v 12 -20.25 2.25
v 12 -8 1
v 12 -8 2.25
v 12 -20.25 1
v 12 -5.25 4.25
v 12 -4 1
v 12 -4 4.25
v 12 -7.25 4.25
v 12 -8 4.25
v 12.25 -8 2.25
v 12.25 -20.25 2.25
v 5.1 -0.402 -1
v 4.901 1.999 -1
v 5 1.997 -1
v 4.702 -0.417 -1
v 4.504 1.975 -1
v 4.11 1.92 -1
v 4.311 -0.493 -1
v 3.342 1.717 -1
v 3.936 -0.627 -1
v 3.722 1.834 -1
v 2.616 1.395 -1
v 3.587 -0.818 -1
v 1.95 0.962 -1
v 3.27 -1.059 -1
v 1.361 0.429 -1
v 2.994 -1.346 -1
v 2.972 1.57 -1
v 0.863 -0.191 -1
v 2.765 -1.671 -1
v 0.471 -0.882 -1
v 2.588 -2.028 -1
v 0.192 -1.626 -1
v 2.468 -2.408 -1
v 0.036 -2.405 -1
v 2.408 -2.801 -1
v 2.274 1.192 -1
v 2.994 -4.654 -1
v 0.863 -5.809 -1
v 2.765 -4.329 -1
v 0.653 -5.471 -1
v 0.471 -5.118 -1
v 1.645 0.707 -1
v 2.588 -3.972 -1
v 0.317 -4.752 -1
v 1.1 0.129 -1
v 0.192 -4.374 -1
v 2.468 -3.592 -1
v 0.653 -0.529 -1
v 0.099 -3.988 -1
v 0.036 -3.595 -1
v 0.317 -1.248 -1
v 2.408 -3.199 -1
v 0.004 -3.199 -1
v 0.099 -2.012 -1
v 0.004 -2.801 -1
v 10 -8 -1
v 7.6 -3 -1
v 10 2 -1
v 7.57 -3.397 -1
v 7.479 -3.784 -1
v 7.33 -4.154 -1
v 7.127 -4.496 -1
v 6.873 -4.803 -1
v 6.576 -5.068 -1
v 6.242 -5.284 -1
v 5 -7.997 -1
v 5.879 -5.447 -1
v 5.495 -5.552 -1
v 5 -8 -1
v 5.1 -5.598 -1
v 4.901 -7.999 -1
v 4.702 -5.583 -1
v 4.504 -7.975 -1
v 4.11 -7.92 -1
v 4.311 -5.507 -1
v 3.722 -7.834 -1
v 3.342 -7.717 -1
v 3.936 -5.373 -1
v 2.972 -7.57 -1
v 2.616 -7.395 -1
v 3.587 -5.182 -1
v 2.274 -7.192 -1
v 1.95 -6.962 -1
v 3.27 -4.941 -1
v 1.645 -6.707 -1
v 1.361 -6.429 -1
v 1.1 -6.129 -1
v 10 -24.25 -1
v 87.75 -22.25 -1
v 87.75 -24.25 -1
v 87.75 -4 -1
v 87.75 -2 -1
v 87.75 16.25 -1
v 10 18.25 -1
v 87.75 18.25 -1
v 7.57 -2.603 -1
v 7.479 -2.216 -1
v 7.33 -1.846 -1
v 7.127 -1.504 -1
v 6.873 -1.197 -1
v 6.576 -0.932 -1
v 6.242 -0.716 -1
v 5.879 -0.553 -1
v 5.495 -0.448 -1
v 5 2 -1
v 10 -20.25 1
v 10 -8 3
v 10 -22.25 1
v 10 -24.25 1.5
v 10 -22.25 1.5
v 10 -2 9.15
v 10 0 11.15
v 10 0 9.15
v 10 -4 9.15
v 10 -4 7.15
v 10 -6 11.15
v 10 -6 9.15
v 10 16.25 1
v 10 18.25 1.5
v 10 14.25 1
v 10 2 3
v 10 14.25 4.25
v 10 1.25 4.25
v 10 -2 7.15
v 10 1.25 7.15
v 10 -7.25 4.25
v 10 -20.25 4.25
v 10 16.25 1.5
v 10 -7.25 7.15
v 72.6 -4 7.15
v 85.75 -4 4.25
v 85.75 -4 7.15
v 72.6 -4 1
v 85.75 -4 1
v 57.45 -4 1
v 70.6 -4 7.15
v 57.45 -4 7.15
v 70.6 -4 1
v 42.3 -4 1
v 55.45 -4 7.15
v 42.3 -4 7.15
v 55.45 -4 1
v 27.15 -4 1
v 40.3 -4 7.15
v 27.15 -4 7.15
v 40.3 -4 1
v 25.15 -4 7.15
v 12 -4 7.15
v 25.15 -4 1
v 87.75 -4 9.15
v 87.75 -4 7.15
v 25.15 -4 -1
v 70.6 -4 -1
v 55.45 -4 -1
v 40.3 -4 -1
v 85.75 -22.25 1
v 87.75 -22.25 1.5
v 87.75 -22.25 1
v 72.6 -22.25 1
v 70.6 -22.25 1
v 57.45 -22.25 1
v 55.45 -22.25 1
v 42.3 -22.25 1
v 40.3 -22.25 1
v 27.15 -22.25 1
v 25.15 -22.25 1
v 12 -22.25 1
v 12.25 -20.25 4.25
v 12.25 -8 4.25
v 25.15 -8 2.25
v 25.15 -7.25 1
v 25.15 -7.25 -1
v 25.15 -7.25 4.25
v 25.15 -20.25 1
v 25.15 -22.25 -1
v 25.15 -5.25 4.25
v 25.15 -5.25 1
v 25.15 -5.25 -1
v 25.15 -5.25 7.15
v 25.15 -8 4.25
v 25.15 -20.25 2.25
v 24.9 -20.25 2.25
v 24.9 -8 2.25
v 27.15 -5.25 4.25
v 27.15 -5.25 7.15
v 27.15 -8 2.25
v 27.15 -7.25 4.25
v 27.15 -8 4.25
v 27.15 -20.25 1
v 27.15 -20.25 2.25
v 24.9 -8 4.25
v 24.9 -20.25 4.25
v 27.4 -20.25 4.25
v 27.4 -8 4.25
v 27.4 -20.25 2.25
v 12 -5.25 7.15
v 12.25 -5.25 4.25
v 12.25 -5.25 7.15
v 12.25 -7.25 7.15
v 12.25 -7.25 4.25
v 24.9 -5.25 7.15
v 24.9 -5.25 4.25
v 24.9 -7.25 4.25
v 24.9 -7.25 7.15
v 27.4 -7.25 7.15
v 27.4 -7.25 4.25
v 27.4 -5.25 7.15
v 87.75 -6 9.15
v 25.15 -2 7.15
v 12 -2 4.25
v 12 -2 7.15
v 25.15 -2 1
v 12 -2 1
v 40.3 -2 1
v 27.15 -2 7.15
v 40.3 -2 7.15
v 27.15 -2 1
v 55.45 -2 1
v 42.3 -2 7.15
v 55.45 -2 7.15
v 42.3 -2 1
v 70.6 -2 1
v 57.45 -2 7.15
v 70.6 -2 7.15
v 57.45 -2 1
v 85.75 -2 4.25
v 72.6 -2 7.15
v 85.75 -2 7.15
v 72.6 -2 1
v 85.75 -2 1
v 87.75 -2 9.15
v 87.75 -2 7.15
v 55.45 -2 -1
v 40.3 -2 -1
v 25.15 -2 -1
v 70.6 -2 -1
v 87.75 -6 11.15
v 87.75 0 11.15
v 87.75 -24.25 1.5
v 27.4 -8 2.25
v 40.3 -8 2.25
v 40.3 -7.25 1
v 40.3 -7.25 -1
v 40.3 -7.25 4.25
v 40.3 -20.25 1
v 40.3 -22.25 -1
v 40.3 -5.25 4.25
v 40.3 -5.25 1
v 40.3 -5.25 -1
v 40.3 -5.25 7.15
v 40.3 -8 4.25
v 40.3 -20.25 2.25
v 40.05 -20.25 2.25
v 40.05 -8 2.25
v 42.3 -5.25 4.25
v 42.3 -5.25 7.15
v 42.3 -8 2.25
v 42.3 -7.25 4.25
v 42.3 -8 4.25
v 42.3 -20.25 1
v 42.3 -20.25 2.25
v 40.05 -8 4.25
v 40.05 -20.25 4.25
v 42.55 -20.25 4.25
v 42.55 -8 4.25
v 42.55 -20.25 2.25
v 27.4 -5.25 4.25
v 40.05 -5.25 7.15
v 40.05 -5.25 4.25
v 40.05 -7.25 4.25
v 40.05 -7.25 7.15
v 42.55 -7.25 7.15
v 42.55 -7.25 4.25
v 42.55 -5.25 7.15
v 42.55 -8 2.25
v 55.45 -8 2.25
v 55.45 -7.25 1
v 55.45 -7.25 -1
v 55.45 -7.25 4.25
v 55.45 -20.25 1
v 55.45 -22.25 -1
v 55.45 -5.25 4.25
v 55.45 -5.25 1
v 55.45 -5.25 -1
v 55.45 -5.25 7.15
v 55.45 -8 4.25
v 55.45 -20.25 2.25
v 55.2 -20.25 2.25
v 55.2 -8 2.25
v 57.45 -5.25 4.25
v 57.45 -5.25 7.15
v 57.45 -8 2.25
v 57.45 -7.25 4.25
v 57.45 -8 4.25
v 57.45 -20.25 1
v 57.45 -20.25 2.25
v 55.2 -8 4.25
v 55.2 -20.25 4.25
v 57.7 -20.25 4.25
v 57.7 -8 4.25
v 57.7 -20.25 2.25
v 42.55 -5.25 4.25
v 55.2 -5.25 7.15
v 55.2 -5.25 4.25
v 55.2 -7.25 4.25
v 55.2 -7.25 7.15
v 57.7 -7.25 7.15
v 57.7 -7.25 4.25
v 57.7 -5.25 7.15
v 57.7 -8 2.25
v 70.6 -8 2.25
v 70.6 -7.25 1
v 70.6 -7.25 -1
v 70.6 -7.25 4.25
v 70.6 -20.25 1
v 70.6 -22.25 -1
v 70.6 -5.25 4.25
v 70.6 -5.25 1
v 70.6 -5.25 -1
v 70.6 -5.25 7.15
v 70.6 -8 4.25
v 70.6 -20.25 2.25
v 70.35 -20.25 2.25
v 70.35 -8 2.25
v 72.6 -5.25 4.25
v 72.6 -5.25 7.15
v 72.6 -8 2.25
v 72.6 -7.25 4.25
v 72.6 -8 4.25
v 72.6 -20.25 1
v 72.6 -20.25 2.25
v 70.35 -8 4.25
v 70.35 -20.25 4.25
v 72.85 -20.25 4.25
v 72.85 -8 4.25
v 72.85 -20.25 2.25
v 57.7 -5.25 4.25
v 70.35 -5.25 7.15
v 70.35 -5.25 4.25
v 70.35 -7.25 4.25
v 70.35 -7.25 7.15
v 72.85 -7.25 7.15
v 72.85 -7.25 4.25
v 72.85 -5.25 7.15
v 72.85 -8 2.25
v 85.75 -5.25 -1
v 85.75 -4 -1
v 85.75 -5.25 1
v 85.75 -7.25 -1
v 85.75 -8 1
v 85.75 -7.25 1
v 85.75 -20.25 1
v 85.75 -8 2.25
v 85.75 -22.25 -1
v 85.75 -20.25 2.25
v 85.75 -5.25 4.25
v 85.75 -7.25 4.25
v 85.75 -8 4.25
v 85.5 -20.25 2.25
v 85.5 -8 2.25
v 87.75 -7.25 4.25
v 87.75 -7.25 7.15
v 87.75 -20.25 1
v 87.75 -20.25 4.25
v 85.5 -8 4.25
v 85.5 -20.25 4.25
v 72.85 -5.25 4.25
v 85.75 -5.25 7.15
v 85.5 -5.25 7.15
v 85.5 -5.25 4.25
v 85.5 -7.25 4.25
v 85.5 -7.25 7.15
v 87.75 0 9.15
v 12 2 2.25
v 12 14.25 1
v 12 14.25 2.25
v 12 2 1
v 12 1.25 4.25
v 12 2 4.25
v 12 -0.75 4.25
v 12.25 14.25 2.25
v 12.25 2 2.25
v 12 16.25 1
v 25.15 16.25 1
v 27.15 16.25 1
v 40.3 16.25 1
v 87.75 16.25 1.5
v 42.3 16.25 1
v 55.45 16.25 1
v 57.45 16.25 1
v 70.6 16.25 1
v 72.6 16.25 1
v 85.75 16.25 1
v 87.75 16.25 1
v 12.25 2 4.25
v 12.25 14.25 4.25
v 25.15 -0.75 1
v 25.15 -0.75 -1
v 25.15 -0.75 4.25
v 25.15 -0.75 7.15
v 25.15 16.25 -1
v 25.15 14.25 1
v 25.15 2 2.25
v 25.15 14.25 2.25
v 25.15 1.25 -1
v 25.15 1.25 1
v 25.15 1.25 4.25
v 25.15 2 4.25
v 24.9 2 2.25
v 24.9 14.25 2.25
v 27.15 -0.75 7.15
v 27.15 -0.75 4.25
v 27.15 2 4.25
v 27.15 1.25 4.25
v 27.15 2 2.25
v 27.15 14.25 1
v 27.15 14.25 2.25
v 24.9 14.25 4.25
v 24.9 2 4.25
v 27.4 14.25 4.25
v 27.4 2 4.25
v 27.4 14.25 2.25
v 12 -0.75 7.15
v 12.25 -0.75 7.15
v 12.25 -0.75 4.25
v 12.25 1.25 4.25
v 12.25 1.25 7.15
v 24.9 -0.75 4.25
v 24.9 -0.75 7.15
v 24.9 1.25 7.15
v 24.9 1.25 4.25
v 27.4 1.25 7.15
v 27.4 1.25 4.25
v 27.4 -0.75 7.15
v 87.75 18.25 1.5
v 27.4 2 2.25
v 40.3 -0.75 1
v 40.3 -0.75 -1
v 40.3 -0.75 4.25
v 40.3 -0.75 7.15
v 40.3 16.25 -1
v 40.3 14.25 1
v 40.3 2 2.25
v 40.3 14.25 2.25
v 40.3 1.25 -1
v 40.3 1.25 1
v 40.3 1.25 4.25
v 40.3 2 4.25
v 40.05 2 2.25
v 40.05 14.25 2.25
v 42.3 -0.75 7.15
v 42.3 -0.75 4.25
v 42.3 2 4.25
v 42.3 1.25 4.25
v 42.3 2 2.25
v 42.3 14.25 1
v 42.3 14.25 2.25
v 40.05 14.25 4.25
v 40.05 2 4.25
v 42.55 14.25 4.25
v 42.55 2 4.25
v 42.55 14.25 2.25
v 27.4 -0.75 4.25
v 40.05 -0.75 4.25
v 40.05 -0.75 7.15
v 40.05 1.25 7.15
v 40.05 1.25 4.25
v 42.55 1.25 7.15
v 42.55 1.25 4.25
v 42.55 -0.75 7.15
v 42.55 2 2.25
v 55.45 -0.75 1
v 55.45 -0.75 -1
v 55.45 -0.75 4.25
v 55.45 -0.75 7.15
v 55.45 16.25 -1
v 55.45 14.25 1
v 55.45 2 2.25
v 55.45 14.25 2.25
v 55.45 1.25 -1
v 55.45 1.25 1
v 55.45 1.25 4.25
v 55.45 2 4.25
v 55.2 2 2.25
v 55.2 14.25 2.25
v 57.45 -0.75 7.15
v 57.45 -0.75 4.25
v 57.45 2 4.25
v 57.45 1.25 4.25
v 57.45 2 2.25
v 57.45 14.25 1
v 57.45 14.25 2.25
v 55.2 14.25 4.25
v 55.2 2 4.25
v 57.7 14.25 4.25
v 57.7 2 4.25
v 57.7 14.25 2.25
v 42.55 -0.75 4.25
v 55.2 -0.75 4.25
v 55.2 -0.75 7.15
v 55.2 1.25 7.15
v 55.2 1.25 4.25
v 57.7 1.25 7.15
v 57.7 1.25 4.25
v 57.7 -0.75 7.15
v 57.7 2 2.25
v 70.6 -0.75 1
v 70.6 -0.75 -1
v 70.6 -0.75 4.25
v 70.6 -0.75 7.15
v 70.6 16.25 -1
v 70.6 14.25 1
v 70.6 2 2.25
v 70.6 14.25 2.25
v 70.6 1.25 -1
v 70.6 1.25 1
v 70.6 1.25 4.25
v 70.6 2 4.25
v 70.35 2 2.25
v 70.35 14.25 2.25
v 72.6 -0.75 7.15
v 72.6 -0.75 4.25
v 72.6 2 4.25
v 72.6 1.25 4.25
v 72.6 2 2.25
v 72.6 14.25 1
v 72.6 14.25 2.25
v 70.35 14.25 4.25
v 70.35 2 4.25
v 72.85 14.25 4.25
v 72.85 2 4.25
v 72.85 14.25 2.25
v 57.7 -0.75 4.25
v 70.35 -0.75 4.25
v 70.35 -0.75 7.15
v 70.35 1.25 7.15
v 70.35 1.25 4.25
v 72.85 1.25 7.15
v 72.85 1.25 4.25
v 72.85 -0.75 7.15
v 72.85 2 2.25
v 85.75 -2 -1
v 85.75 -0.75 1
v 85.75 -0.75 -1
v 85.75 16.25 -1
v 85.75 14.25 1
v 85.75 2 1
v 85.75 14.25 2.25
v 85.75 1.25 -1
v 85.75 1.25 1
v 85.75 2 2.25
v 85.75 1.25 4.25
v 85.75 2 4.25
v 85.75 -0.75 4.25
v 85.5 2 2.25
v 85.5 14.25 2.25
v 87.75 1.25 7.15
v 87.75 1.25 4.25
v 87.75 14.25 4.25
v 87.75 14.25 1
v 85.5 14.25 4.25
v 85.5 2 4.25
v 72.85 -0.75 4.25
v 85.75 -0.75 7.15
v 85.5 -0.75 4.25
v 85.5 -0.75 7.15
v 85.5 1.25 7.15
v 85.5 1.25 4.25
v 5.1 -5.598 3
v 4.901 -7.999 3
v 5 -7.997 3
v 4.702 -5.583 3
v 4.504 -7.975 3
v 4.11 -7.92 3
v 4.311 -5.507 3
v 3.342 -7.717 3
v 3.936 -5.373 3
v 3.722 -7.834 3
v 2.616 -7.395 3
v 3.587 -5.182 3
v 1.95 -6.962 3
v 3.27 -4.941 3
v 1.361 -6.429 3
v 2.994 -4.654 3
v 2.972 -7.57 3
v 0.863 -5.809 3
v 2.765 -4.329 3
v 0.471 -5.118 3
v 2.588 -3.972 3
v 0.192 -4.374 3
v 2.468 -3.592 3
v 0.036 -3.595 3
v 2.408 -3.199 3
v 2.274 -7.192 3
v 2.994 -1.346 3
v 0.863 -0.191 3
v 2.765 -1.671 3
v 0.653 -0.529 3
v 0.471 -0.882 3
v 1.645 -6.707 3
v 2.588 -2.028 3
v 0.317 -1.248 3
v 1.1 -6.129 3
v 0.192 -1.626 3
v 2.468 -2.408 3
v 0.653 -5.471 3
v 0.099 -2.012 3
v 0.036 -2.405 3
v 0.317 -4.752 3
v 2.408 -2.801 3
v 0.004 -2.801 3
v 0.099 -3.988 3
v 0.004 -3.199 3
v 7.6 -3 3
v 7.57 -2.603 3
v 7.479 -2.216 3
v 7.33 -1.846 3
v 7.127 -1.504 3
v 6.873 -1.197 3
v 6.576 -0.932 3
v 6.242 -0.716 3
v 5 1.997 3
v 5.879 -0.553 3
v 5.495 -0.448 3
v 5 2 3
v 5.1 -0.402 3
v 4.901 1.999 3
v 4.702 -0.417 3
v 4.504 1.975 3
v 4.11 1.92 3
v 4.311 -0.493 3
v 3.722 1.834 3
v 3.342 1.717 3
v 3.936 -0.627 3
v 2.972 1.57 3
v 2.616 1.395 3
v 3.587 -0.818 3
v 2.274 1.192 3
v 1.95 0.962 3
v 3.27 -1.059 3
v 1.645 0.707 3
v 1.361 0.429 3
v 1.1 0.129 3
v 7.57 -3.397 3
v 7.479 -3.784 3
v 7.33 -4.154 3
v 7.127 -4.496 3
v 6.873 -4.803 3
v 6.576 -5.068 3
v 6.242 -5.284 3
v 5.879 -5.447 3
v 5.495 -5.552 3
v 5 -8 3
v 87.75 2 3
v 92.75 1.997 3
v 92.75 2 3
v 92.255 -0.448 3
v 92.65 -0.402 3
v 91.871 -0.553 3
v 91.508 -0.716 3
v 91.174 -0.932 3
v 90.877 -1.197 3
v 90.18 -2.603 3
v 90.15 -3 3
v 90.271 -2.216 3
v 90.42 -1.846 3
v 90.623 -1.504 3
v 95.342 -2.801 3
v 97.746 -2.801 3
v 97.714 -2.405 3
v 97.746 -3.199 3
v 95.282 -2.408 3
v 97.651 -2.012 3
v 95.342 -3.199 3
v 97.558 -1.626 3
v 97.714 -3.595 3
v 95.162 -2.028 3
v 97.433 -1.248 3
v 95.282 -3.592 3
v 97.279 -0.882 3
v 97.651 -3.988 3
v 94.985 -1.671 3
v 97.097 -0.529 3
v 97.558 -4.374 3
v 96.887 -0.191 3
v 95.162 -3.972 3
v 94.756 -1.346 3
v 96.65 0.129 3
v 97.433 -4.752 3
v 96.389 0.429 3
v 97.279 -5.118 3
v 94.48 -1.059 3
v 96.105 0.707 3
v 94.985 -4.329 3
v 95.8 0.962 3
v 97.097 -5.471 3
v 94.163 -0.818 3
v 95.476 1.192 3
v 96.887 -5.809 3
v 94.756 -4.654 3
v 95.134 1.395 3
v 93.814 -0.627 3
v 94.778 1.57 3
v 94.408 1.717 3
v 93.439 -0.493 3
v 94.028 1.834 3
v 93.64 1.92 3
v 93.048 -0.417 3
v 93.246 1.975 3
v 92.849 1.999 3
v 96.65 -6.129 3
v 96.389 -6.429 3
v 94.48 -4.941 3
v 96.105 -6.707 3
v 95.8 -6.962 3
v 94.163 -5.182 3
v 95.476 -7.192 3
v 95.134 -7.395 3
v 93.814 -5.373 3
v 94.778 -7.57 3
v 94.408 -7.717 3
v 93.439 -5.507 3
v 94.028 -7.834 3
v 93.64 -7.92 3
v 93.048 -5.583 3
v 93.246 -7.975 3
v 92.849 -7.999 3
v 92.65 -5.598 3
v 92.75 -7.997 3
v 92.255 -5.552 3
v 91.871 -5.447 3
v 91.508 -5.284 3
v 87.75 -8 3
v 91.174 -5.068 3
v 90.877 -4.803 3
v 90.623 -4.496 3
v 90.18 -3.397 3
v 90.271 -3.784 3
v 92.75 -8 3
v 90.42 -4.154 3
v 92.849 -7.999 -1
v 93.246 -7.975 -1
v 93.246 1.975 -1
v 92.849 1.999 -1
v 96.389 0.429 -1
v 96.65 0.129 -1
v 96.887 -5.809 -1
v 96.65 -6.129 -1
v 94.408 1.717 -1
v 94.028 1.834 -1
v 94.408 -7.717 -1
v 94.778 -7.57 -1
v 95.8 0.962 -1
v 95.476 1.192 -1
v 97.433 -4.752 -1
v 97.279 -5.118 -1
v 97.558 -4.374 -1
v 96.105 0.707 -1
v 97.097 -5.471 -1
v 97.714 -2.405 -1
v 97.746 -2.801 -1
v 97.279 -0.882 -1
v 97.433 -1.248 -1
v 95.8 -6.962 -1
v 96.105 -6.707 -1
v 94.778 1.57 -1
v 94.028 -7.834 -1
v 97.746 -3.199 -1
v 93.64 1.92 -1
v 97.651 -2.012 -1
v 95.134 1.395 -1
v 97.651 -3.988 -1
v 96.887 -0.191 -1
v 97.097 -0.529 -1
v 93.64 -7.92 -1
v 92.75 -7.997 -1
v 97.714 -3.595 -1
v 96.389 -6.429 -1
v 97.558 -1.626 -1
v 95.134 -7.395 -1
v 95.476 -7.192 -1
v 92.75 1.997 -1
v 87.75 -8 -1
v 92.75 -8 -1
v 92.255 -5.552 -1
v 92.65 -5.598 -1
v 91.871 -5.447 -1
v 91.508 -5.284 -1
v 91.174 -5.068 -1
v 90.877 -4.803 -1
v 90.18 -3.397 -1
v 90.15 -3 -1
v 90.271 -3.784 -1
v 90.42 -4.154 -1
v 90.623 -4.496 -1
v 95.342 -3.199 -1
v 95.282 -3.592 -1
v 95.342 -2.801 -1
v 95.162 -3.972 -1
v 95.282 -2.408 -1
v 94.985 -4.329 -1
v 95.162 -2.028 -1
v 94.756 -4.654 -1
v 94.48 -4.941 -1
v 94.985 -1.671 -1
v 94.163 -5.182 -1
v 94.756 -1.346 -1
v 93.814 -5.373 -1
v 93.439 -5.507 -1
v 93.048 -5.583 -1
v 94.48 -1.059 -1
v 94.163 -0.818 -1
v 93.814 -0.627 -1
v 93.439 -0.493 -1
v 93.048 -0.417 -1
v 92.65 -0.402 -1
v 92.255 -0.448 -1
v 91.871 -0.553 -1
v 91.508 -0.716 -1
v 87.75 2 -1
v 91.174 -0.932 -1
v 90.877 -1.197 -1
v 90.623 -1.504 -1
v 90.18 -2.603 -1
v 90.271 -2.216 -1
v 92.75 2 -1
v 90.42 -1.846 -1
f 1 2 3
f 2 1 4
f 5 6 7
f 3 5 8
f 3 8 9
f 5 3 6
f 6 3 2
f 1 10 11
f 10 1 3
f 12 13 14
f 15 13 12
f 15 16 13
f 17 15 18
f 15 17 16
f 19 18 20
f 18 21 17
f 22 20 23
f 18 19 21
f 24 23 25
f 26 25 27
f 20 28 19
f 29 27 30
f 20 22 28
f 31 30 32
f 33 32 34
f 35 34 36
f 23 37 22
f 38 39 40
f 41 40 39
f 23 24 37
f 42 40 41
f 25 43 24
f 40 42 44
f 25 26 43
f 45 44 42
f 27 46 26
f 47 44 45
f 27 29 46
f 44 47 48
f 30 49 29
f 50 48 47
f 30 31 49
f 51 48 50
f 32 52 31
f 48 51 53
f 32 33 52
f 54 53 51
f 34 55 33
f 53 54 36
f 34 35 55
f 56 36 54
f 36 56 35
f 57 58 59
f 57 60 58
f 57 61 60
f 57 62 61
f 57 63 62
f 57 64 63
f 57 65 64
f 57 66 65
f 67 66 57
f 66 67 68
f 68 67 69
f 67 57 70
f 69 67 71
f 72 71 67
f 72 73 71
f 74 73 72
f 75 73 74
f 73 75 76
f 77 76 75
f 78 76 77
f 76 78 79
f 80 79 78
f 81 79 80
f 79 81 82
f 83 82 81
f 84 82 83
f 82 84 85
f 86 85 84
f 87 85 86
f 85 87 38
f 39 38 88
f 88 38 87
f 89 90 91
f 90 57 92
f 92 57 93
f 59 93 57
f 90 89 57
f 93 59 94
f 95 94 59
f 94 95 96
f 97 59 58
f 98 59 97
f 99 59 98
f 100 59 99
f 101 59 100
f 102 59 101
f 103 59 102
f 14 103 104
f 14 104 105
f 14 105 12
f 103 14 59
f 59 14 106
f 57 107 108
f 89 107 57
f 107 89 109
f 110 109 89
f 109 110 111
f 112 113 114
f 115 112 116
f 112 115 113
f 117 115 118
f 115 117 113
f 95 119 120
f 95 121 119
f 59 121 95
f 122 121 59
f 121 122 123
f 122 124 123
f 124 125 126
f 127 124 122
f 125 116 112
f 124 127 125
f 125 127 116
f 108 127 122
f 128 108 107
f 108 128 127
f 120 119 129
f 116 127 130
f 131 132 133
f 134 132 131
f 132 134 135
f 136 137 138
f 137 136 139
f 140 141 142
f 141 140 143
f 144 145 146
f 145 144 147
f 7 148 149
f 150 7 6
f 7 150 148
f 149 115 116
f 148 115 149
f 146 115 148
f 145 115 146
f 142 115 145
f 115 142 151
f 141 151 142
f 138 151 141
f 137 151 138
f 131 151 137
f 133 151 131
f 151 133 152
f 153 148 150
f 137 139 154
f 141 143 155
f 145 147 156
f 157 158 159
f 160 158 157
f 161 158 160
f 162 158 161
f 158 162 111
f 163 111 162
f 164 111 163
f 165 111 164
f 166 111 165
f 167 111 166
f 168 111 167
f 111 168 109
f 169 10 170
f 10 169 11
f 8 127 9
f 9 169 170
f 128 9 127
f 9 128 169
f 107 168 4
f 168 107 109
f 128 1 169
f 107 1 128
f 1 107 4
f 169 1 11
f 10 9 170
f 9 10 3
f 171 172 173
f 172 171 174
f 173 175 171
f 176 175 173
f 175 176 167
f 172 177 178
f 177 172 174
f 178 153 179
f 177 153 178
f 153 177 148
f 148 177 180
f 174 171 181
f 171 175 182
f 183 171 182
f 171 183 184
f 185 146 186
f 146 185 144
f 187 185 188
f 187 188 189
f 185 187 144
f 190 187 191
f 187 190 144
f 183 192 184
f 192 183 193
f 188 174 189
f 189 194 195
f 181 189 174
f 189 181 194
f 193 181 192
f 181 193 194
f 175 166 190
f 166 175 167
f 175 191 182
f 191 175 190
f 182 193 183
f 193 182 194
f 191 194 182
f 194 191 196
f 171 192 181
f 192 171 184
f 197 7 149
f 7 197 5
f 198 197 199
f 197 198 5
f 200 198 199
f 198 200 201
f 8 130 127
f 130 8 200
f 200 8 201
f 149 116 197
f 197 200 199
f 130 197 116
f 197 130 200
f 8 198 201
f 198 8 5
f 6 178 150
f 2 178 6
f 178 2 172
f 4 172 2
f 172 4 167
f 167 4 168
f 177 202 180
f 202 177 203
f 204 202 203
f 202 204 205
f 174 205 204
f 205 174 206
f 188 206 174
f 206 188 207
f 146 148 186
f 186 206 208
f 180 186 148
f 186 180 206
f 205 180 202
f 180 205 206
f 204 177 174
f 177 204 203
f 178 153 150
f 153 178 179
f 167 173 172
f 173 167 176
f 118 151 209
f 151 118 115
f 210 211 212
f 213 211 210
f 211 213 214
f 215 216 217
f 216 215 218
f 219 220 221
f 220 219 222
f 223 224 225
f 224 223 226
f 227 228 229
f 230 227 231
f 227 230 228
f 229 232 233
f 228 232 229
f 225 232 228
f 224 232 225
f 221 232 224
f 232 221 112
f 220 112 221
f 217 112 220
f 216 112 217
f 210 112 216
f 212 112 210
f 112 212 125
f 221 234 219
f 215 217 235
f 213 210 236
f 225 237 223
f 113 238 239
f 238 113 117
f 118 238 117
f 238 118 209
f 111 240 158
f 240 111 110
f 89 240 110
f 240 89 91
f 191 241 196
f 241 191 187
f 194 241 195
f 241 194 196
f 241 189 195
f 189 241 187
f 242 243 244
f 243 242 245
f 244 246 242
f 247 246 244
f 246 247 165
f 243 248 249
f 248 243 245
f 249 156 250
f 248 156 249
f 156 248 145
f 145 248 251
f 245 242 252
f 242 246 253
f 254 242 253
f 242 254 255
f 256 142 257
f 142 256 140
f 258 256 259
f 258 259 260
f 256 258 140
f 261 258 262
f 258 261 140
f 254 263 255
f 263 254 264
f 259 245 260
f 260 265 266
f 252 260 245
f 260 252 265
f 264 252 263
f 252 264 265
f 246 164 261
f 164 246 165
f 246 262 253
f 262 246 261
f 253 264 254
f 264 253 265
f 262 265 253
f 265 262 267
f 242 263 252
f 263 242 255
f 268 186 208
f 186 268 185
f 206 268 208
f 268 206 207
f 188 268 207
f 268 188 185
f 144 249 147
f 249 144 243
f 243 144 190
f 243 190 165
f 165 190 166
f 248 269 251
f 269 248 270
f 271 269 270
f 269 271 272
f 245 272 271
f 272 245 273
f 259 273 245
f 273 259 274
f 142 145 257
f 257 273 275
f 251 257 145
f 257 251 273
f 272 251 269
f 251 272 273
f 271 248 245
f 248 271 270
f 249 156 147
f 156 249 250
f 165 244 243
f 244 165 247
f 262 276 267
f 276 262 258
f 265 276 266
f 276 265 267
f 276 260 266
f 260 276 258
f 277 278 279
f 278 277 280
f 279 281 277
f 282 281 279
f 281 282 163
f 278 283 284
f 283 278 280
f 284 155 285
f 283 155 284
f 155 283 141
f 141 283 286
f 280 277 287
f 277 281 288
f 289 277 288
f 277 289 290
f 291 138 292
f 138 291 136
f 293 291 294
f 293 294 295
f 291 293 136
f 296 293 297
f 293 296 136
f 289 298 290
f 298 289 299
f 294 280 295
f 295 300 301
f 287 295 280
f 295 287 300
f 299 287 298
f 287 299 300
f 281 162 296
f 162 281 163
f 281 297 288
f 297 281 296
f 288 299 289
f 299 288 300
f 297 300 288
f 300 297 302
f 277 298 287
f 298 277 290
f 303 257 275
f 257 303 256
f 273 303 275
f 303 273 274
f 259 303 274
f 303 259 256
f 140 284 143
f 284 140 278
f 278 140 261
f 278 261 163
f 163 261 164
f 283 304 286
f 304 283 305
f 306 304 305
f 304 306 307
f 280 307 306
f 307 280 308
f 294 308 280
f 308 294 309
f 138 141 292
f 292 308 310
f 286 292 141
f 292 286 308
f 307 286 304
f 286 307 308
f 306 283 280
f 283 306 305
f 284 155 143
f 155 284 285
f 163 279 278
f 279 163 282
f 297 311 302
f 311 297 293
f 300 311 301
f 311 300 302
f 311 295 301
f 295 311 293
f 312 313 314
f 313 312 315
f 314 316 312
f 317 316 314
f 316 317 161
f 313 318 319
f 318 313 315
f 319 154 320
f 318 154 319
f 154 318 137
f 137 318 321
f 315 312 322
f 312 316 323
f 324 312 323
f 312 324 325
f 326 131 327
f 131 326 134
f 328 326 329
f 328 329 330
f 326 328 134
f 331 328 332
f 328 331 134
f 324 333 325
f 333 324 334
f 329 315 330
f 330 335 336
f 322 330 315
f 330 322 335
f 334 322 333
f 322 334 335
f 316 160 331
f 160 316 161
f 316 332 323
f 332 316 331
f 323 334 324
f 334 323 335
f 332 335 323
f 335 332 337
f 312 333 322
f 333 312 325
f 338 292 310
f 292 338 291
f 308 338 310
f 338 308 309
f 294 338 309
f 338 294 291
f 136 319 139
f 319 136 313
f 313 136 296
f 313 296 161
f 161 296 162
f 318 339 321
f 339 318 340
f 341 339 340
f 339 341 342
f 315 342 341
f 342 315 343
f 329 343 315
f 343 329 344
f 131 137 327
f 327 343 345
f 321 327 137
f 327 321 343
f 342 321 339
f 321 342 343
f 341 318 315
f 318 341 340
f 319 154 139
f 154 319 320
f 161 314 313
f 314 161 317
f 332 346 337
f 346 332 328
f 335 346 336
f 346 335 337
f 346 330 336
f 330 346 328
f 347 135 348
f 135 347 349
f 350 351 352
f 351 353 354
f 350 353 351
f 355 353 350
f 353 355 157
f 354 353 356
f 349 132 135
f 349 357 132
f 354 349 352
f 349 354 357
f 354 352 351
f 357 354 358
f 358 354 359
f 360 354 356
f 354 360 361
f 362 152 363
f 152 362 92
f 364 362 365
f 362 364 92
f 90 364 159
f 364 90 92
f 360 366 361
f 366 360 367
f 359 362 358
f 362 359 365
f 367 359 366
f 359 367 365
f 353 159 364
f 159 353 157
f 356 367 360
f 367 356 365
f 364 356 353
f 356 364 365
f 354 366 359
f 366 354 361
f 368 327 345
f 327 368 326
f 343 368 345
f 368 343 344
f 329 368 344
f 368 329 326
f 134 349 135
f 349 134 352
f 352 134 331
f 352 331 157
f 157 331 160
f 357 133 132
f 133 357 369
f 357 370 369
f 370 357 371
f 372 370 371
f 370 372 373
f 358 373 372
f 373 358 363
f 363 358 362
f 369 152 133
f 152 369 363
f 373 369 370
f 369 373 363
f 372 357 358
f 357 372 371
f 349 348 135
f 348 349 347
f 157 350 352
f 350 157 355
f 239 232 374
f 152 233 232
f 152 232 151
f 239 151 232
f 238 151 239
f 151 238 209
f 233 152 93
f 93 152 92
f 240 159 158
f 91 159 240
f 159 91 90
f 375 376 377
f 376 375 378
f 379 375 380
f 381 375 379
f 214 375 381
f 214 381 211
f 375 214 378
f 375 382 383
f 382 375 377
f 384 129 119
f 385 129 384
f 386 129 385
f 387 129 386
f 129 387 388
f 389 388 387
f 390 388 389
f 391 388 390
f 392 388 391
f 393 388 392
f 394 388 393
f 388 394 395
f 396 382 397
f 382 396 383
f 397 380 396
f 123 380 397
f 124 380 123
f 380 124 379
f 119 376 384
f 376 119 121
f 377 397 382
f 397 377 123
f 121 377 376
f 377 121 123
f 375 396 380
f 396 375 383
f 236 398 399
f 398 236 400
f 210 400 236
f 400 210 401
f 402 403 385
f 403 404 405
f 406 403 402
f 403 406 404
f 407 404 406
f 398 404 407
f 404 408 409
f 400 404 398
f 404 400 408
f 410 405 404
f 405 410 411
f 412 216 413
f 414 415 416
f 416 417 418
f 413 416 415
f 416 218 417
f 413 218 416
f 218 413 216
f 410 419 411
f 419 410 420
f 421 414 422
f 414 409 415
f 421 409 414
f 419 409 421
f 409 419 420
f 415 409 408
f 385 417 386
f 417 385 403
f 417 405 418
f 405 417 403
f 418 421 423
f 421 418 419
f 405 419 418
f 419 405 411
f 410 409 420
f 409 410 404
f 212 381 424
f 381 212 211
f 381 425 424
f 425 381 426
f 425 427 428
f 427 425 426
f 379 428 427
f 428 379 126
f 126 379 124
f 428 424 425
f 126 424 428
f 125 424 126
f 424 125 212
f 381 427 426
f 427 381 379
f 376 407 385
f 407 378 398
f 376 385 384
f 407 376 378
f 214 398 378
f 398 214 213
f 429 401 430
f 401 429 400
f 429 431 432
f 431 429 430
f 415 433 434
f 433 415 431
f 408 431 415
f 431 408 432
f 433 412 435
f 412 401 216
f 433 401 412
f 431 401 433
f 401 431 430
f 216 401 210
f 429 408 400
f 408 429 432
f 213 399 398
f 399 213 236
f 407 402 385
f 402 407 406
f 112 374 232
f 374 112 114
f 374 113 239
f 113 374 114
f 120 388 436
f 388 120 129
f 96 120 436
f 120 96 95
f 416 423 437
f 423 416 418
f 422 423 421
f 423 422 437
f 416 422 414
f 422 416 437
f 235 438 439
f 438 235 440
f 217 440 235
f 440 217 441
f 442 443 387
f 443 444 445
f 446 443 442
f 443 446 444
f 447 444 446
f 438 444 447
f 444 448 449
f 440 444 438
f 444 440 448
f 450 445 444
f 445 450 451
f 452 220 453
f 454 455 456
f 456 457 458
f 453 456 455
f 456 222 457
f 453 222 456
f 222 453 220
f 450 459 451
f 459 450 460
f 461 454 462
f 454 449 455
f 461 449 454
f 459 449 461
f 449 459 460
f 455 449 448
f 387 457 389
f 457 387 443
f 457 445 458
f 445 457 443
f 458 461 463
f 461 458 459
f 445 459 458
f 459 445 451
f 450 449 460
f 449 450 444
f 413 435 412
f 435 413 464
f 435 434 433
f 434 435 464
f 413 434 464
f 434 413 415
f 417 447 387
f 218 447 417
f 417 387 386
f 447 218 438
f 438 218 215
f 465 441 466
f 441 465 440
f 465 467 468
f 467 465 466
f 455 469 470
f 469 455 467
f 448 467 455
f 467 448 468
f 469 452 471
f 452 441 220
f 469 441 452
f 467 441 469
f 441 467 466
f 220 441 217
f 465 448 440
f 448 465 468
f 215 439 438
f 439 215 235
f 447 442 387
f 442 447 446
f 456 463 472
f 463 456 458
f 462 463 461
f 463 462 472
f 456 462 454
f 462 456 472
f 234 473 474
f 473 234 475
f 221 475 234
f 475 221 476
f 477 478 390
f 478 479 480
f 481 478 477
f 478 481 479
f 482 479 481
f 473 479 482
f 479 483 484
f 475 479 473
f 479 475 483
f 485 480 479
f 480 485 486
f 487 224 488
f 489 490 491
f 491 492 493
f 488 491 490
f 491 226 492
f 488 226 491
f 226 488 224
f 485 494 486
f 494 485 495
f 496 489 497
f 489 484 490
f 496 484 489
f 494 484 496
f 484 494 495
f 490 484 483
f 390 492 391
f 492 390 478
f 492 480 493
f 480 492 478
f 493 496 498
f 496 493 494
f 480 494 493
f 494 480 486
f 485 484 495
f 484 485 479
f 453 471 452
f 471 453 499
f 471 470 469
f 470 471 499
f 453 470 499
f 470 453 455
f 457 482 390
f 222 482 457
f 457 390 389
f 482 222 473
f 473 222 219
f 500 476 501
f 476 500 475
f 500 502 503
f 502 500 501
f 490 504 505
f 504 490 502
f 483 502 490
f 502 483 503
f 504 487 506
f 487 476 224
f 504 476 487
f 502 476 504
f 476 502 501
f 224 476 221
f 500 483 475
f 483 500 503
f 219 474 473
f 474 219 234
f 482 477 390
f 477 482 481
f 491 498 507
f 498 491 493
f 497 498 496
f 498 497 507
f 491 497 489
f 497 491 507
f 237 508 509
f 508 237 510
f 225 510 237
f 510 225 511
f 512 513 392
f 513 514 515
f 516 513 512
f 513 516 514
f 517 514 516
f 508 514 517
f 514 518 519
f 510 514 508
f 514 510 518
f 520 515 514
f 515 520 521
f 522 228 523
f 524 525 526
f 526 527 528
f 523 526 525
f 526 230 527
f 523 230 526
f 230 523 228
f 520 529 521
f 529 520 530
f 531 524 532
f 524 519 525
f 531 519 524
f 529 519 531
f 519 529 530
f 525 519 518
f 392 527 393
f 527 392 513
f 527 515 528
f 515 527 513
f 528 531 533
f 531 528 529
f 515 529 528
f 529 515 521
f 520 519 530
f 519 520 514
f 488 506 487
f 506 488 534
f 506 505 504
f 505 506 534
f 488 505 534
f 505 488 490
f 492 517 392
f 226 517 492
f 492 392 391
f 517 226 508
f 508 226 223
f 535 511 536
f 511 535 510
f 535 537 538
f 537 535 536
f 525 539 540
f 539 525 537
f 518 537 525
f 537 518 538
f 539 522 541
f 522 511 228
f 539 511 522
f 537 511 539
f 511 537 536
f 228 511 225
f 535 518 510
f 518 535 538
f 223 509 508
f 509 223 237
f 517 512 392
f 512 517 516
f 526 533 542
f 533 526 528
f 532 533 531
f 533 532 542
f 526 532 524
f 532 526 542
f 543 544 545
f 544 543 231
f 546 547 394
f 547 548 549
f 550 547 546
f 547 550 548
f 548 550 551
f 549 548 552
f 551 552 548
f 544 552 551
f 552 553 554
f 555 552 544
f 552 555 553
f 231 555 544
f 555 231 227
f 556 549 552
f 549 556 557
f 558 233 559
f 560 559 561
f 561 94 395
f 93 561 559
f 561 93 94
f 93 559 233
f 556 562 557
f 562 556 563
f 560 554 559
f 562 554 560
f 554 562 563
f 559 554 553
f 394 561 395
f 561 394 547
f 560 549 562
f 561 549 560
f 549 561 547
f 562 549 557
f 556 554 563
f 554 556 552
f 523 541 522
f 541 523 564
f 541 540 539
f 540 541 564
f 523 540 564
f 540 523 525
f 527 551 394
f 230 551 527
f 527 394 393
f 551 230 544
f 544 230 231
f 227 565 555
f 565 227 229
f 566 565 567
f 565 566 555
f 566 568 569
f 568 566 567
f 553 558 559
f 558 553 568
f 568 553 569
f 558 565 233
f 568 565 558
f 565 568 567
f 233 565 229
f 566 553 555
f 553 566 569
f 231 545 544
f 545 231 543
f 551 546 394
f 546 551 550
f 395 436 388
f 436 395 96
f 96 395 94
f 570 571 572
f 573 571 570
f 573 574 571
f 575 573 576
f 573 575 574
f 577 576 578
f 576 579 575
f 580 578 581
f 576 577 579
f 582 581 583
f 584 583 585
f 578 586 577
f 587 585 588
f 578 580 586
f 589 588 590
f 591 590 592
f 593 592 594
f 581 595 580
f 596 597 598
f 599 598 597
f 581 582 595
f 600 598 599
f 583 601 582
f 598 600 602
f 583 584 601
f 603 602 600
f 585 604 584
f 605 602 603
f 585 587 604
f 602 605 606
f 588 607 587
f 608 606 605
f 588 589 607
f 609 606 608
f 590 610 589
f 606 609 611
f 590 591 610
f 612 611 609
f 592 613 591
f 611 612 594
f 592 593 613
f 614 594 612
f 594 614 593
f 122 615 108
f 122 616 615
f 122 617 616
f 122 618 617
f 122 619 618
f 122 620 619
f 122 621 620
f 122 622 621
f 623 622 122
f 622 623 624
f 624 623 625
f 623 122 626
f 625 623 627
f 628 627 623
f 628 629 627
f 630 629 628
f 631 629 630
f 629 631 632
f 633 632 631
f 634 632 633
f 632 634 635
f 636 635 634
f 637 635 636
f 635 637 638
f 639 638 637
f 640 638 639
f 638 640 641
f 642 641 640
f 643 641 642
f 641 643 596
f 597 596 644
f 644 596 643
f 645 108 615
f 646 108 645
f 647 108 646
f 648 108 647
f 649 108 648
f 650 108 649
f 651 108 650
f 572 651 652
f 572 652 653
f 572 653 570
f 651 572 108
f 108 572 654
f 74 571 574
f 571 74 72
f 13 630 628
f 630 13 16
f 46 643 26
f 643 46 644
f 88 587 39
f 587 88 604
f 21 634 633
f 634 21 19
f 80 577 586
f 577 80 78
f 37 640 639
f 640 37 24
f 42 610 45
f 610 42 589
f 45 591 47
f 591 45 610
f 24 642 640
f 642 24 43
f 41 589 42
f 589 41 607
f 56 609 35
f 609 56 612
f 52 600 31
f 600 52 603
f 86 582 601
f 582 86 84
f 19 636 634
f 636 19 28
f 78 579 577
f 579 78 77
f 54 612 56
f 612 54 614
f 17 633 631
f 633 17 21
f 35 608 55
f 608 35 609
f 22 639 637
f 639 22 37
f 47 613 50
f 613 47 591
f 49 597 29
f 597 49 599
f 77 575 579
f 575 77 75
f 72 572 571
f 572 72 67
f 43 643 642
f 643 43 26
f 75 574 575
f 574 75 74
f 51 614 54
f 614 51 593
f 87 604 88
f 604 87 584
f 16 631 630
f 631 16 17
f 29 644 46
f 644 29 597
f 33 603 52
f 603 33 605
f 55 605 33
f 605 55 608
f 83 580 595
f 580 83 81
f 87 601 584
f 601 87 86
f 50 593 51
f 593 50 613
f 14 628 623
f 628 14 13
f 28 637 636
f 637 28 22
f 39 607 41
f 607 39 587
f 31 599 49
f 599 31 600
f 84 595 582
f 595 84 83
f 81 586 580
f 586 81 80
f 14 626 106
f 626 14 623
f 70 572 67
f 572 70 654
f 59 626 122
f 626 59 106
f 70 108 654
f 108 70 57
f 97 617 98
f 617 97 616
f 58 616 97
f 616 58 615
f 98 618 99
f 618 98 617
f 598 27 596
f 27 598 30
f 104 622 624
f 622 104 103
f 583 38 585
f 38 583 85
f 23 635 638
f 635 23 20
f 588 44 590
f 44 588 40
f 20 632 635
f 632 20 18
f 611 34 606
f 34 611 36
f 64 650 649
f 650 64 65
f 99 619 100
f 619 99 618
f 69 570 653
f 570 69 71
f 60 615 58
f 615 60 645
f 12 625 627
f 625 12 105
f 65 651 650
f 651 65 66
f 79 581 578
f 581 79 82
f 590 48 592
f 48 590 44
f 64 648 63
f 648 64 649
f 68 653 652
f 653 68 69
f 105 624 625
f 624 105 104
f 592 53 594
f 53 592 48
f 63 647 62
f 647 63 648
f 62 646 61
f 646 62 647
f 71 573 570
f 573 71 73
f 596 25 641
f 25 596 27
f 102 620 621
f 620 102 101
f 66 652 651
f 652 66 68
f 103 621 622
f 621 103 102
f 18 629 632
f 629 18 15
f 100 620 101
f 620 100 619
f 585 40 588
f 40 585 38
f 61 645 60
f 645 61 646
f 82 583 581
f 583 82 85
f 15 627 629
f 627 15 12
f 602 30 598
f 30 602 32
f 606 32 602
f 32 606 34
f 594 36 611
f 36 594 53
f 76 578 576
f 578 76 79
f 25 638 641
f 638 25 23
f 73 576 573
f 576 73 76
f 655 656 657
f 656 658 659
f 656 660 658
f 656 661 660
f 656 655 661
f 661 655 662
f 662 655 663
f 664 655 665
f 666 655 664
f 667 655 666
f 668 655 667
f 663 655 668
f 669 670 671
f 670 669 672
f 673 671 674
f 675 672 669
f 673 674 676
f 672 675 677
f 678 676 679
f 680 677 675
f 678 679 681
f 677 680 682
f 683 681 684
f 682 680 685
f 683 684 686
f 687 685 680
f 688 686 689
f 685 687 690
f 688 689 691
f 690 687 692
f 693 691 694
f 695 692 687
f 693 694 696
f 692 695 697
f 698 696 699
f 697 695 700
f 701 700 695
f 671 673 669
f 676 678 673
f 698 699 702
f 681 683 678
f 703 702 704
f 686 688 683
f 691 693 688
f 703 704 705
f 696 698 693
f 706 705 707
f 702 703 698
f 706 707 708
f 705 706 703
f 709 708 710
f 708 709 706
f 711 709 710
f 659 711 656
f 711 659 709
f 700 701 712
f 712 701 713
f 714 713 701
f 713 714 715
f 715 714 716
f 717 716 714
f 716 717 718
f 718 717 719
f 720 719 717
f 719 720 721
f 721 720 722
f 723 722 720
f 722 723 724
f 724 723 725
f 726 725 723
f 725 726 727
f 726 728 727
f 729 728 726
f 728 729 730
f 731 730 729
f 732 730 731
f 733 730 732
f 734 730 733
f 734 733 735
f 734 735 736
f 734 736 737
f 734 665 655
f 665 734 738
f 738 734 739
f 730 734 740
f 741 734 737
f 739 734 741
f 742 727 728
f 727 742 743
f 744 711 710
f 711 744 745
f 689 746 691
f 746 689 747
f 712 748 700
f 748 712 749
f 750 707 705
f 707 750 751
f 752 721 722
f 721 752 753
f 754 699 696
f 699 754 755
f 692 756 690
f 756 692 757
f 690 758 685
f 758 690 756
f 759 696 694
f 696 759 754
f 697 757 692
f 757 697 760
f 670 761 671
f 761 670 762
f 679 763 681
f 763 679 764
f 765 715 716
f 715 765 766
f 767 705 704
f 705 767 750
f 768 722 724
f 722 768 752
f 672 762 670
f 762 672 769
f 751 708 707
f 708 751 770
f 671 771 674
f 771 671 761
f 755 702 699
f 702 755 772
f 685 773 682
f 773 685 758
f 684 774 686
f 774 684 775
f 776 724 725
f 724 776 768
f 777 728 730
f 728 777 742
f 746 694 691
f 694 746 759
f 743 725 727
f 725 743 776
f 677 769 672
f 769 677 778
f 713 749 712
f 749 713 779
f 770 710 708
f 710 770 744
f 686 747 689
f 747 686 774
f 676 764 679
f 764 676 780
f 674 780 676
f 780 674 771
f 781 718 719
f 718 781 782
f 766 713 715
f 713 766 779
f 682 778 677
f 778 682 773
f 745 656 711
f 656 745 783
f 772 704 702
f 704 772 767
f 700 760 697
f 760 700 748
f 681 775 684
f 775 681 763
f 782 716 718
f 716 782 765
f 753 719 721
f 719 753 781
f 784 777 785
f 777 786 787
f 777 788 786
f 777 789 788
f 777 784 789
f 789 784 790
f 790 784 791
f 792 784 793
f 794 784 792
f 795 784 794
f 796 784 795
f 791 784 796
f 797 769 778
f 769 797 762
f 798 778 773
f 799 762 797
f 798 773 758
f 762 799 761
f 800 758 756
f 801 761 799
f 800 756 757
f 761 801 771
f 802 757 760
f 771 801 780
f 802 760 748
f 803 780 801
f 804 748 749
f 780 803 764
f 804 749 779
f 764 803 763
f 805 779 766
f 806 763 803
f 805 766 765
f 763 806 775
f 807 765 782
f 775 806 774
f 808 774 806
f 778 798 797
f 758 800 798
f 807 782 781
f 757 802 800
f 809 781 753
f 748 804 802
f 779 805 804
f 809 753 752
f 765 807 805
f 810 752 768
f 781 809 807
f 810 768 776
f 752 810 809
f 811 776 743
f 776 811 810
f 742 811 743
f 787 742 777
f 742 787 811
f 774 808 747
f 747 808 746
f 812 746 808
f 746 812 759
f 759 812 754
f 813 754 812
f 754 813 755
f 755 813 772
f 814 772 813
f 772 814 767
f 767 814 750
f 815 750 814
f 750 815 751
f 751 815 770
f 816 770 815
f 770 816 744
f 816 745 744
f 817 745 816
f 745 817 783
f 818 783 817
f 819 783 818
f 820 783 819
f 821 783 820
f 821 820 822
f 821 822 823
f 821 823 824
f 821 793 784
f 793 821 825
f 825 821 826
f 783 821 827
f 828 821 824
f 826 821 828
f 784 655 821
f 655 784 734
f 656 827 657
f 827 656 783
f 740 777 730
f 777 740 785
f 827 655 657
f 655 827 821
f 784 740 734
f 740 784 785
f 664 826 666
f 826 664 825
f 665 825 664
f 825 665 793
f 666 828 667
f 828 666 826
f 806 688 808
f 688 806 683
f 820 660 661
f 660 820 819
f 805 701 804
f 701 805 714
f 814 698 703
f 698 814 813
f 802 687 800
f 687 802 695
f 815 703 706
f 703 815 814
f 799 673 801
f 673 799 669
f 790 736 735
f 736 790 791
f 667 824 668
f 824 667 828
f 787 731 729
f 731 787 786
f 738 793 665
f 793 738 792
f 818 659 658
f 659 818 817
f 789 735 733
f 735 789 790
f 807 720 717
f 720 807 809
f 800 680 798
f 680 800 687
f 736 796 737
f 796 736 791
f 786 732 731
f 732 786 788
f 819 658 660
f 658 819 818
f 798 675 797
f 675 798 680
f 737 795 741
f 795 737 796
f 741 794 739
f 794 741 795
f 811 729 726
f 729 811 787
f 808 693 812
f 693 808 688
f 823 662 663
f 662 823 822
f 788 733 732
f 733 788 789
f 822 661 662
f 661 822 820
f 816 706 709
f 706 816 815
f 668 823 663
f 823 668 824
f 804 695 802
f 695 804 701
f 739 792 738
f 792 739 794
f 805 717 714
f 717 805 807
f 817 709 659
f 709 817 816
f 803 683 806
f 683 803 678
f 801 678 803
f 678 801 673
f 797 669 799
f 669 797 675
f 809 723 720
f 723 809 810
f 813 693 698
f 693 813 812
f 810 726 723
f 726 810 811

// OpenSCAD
// ////////////////////////////////////////////////
//
// WAGO 221 mount
//
// Creates a single row or double row set of 221 blocks
// with mounting tabs/ears at either end.
//
// Created - 2017/01/01 by Joo Chung
//
// ////////////////////////////////////////////////

// ////////////////////////////////////////////////
// vector of blocks. each element specifies the number of conductors for that block
// EDIT THIS
blocks = [2,2,2,2,2]; // a single 5 conductor blocks 
// blocks = [5, 3, 2]; // a set of 5 conductor, 3 conductor, 2 conductor blocks
// blocks = [5, 5, 5]; // a set of three 5 conductor blocks
// blocks = [2]; // a single 2 conductor block
// blocks = [3]; // a single 3 conductor block


// ////////////////////////////////////////////////
// Mirror the mount, stand it up, and put tabs on bottom.
// 0 - no mirror, 1 - mirror, rotate so its standing up, and reposition tabs
// 2 - mirror, rotate so that they are laying flat, and reposition tabs.
// EDIT THIS
mirror = 2;

// ////////////////////////////////////////////////
// Tabs - include or exclude mounting tabs
// EDIT THIS: 0 - no tabs, 1 - tabs
tabs = 1;
// EDIT THIS: radius of hole in tab
tabradius = 2.6;
// EDIT THIS: thickness of tab
tabheight = 4;
// EDIT THIS: Set width and length of the tab. (tab is basically a square)
tabwidth = 10;



// ////////////////////////////////////////////////
// Block dimensions in mm -- DO NOT EDIT
conwidth = 5.6; // width of a single conductor
// DO NOT EDIT
border = 1.75; // block transparent plastic border
// DO NOT EDIT
blockdepth = 18.25;
// DO NOT EDIT
fudge = 0.2;

// ////////////////////////////////////////////////
// OpenSCAD special variables -- DO NOT EDIT
$fa = 1;
// DO NOT EDIT
$fs = 0.4;

// ////////////////////////////////////////////////
// Functions
function bw(x) = conwidth*x+border+fudge; // block width
function mw(i, n) = ( i==0 ? bw(blocks[i]) + 2 + mw(i+1, n) : (i < n ? bw(blocks[i]) + 2 + mw(i+1, n) : 0)); // mount width (index, max index)


// ////////////////////////////////////////////////
// Modules
module tab(width, hole, thickness) {
    difference() {
        union () {
            cylinder(thickness,width/2,width/2, true);
            translate([width/4,0,0]) cube([width/2,width,thickness], true);
        }
    cylinder(width,hole,hole, true);
    }
}

module shoulder (depth) {
    difference () {
        union () {
            cube([2, blockdepth, 3.25], false);
            translate([0,0,3.25]) cube([2.25, blockdepth, 2], false);
        }
        translate([0,0,2]) cube([2.25,2,3.25], false);
        translate([2,blockdepth-4,2]) cube([0.25,4,3.25], false);
    }
}


module backshoulder (height) {
    difference() {
        union() {  
            translate([0, 2, 0]) cube ([2, 1.25, 10.15]);
            cube ([2.25, 2, 10.15]);
        }
        translate([0,0,10.15-2]) cube([2.25,3.25,2]);
        translate([2,0,2]) cube([1.25,3.25,3.25]);
    }
}



// WAGO 221 block
module block (nconn) {
    blockwidth = bw(nconn);

    // base
    translate([2,2,0]) cube([blockwidth, blockdepth, 2], false);
    
    // back headboard
    translate([0,blockdepth+2,0]) cube([blockwidth+4, 2, 10.15], false);

    // back lip
    translate([0,blockdepth,10.15]) cube([blockwidth+4, 4, 2], false);
    
    // front lip
    translate([0,0,0]) cube([blockwidth+4, 2, 2.5], false);

    // left shoulder and right shoulders
    translate([0,2,0]) shoulder();
    translate([blockwidth+4,2,0]) mirror() shoulder(); 
    
    // back left and shoulder
    translate([0, blockdepth-1.25, 0]) backshoulder(); 
    translate([blockwidth+4, blockdepth -1.25, 0]) mirror() backshoulder();
    
}



// ////////////////////////////////////////////////
// MAIN BODY

mountwidth=mw(0, len(blocks));
if (mirror==0) { // No mirror. Single row of blocks
    // create array of blocks
    for (i=[0:len(blocks)-1]) {
        offset = (i==0) ? tabwidth : tabwidth + mw(0, i);
        translate([offset, 0, 0]) block(blocks[i]);
    }
    
    // left and right tabs
    if (tabs==1) {
        translate([tabwidth/2,(blockdepth+4)/2,tabheight/2]) tab (tabwidth, tabradius, tabheight);
        translate([mountwidth+2+tabwidth+tabwidth/2,(blockdepth+4)/2,tabheight/2]) mirror() tab (tabwidth, tabradius, tabheight);
    }
} else if (mirror==1) { // Mirrored. two rows of blocks, back to back.
    // Row #1. Stand up on headboard.
    rotate([-90,0,0]) for (i=[0:len(blocks)-1]) {
        offset = (i==0) ? tabwidth : tabwidth + mw(0, i);
        translate([offset, 0, -1]) block(blocks[i]);
    }
    
    // Row #2. Opposite rotation. Stand up on headbord
    rotate([90,0,0]) mirror ([0, 1, 0]) for (i=[0:len(blocks)-1]) {
        offset = (i==0) ? tabwidth : tabwidth + mw(0, i);
        translate([offset, 0, -1]) block(blocks[i]);
    }   
    
    // left and right tabs
    if (tabs==1) {
        translate([tabwidth/2,0,-blockdepth-tabheight/2]) tab (tabwidth, tabradius, tabheight);
        translate([mountwidth+2+tabwidth+tabwidth/2,0,-blockdepth-tabheight/2]) mirror() tab (tabwidth, tabradius, tabheight);
    }
} else if (mirror==2) {
    // Row #1. 
    for (i=[0:len(blocks)-1]) {
        offset = (i==0) ? tabwidth : tabwidth + mw(0, i);
        translate([offset, -blockdepth-6, -1]) block(blocks[i]);
    }
    
    // Row #2. Flip
    mirror ([0, 1, 0]) for (i=[0:len(blocks)-1]) {
        offset = (i==0) ? tabwidth : tabwidth + mw(0, i);
        translate([offset, -blockdepth, -1]) block(blocks[i]);
    }   
    
    // left and right tabs
    if (tabs==1) {
        translate([tabwidth/2,-3,(tabheight-2)/2]) tab (tabwidth, tabradius, tabheight);
        translate([mountwidth+2+tabwidth+tabwidth/2,-3,(tabheight-2)/2]) mirror() tab (tabwidth, tabradius, tabheight);
    }
}
